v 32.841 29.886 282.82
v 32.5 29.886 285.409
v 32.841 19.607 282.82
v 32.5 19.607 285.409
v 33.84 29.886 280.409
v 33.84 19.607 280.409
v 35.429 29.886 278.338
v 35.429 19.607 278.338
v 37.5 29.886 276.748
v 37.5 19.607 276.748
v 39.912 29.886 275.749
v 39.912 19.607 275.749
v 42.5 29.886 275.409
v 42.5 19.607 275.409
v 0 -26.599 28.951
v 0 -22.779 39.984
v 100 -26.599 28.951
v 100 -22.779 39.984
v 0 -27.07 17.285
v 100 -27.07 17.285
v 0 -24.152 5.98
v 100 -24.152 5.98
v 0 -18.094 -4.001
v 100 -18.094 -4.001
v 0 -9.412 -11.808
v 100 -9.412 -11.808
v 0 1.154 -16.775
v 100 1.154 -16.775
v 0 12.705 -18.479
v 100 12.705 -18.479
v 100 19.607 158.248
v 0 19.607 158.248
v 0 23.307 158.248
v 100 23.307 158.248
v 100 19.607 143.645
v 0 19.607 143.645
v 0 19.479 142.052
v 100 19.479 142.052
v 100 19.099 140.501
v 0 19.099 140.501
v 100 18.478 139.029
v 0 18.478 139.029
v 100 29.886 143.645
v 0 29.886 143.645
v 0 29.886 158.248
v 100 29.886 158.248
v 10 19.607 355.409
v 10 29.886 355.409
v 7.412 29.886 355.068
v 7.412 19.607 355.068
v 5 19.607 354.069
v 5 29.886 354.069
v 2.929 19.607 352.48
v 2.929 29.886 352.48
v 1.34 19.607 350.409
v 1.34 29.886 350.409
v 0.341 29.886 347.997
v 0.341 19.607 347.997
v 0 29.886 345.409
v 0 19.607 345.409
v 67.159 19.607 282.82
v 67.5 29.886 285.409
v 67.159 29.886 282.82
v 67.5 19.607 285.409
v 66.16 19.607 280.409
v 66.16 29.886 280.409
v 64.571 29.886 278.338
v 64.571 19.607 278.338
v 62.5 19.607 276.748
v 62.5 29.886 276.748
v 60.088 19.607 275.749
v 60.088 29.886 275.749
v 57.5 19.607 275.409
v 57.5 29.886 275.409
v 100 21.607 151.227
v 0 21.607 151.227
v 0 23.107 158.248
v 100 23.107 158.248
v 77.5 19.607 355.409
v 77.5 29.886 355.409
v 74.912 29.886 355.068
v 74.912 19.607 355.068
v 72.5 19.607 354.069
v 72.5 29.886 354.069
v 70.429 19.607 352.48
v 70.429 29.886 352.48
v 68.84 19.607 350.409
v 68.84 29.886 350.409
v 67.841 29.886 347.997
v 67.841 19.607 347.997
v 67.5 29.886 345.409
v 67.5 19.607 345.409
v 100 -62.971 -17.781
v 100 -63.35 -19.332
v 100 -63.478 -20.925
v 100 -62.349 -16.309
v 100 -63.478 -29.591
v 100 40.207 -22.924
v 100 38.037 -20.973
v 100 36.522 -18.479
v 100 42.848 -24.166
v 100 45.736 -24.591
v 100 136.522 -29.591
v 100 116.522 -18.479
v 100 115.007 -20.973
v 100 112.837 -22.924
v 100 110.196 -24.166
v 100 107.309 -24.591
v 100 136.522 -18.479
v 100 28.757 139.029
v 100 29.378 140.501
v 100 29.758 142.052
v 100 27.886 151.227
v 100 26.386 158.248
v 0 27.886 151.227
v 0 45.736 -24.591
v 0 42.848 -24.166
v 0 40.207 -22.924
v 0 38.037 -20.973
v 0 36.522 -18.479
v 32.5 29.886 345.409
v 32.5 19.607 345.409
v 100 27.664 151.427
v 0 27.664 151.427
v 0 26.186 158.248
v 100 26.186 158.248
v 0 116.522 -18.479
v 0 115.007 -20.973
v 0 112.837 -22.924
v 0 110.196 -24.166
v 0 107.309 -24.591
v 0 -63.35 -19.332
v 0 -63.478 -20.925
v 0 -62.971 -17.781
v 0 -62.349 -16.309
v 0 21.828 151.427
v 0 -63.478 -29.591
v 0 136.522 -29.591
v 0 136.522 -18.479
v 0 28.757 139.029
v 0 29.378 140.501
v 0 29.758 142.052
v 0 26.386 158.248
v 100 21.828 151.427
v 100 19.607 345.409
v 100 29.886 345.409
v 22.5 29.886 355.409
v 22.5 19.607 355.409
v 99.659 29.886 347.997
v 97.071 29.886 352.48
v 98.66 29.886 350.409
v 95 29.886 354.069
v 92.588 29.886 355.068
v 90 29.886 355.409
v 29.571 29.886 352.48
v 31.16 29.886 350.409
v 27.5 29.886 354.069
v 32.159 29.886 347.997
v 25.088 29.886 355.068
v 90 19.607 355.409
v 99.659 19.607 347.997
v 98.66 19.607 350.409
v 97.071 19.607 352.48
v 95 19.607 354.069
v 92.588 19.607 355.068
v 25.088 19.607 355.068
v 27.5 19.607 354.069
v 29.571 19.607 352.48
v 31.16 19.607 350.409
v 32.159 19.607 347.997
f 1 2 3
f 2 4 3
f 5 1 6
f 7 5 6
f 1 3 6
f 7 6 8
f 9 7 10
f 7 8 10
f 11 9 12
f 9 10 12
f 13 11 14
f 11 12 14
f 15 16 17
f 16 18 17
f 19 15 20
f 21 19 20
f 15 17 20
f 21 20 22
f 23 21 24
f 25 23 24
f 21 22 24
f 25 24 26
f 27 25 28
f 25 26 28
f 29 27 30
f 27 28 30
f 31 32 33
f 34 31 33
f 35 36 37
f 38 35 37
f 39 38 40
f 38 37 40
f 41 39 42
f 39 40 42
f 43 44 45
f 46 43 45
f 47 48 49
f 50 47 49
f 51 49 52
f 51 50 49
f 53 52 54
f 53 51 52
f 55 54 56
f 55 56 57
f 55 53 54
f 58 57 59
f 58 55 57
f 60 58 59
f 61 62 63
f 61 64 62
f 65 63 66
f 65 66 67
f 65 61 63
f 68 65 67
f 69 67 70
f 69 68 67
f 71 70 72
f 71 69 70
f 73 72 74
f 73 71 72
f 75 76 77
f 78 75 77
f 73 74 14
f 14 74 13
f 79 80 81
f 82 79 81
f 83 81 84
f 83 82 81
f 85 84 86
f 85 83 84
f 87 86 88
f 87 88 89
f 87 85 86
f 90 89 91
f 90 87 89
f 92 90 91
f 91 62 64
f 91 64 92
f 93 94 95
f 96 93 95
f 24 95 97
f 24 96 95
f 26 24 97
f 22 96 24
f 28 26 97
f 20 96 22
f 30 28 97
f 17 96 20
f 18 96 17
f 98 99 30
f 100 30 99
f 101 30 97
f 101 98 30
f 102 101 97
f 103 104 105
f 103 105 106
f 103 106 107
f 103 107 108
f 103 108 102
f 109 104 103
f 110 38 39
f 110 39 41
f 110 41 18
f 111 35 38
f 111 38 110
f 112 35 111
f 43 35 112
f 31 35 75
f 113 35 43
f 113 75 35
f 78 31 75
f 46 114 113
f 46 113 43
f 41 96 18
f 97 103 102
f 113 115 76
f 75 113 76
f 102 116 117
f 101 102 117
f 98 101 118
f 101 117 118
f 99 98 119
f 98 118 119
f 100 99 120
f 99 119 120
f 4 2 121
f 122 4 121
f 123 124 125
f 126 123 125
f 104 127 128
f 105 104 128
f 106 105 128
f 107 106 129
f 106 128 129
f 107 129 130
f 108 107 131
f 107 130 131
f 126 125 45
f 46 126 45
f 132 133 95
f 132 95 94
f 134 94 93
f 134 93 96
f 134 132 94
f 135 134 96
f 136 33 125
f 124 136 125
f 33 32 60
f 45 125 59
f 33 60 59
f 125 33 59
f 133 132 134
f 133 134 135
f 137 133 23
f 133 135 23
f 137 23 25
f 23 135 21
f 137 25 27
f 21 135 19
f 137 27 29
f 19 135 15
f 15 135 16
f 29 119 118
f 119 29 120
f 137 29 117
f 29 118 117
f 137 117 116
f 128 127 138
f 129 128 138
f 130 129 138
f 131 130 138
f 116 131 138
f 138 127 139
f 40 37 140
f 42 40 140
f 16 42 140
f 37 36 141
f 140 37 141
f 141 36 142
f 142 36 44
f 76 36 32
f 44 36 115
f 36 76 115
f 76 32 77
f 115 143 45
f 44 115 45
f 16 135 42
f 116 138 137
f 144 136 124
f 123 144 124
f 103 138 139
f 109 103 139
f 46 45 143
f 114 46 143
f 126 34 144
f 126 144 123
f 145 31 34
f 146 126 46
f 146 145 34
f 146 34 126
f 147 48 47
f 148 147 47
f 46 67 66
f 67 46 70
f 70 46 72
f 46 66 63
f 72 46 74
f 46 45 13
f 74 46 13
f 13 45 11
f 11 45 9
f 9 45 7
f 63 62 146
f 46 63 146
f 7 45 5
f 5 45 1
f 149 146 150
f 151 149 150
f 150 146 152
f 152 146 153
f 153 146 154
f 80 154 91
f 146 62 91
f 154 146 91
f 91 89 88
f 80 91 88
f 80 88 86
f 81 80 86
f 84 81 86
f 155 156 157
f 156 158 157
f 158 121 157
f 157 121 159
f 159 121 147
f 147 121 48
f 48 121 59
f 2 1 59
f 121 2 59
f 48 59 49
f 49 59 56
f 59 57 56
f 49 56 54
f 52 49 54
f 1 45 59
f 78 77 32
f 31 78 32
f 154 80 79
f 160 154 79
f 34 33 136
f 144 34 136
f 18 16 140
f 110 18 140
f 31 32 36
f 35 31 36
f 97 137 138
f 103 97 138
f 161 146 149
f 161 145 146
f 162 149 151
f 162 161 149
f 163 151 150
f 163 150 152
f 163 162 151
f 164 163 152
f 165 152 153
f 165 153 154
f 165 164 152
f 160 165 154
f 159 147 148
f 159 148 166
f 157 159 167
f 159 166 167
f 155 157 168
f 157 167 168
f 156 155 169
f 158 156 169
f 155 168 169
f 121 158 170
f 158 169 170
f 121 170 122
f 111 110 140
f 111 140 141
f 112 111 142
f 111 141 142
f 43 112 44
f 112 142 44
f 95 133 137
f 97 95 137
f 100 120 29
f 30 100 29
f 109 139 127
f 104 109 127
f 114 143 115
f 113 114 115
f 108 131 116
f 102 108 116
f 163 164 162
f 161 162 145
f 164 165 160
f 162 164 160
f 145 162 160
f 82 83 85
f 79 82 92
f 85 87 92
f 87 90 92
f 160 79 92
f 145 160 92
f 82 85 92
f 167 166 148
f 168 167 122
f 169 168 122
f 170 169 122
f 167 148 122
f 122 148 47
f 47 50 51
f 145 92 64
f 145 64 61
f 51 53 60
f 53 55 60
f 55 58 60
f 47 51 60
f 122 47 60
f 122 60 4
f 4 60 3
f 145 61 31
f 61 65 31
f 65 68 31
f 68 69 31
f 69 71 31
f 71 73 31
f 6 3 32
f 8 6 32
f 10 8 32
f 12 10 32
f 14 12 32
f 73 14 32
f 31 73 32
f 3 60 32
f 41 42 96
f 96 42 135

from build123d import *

# Parameters (mm, degrees)
F1_DEPTH    = 100
F2_T1_DEPTH = 100
F2_T3_DEPTH = 100
F2_T5_DEPTH = 100
F2_T7_DEPTH = 112.2298810339
F2_T9_DEPTH = 112.2298810339
F4_DEPTH    = 100
F5_W        = 35
F5_H        = 80
F6_DEPTH    = 25
F7_R        = 10
F8_R        = 40


# Not quite as in the source:
# - a fillet or chamfer that OpenCascade refuses, or shapes differently, is made with other operations: its cross-section is extruded or revolved along the edge and cut away or added


with BuildPart() as f1:
    # F0 (on Right) → F1 (new body)
    with BuildSketch(Plane.YZ):
        Polygon((136.5221505807, -29.5914116513), (136.5221505807, -18.4788270524), (116.5221505807, -18.4788270524), (116.5221505807, -24.5914116513), (36.5221505807, -24.5914116513), (36.5221505807, -18.4788270524), (-53.1987108176, -18.4788270524), (-63.4778494193, -18.4788270524), (-63.4778494193, -29.5914116513), align=None)
        Polygon((19.6065225478, 158.2476049662), (19.6065225478, 141.1989332489), (29.8856611494, 141.1989332489), (29.8856611494, 158.2476049662), (26.3856611494, 158.2476049662), (27.8856611494, 151.2272953987), (21.6065225478, 151.2272953987), (23.1065225478, 158.2476049662), align=None)
        Polygon((19.6065225478, 141.1989332489), (-63.4778494193, -18.4788270524), (-53.1987108176, -18.4788270524), (29.8856611494, 141.1989332489), align=None)
    extrude(amount=F1_DEPTH)

    # F2: fillet of radius 10 on 5 edges, made by hand

    # F2_s2 → F2_t1 (join)
    with BuildSketch(Plane.YZ):
        with BuildLine():
            ThreePointArc((116.5221505807, -18.4788270524), (112.8370564508, -22.9243029266), (107.3086820971, -24.5914116513))
            Line((107.3086820971, -24.5914116513), (116.5221505807, -24.5914116513))
            Line((116.5221505807, -24.5914116513), (116.5221505807, -18.4788270524))
        make_face()
    extrude(amount=F2_T1_DEPTH)

    # F2_s4 → F2_t3 (join)
    with BuildSketch(Plane.YZ):
        with BuildLine():
            ThreePointArc((45.7356190644, -24.5914116513), (40.2072447107, -22.9243029266), (36.5221505807, -18.4788270524))
            Line((36.5221505807, -18.4788270524), (36.5221505807, -24.5914116513))
            Line((36.5221505807, -24.5914116513), (45.7356190644, -24.5914116513))
        make_face()
    extrude(amount=F2_T3_DEPTH)

    # F2_s6 → F2_t5 (join)
    with BuildSketch(Plane.YZ):
        with BuildLine():
            ThreePointArc((19.6065225478, 143.6449094556), (19.3201693098, 141.2689745696), (18.4775092312, 139.029111013))
            Line((18.4775092312, 139.029111013), (19.6065225478, 141.1989332489))
            Line((19.6065225478, 141.1989332489), (19.6065225478, 143.6449094556))
        make_face()
    extrude(amount=F2_T5_DEPTH)

    # F2_s8 → F2_t7 (cut)
    with BuildSketch(Plane.YZ.offset(-6.114940517)):
        with BuildLine():
            ThreePointArc((28.7566478328, 139.029111013), (29.5993079114, 141.2689745696), (29.8856611494, 143.6449094556))
            Line((29.8856611494, 143.6449094556), (29.8856611494, 141.1989332489))
            Line((29.8856611494, 141.1989332489), (28.7566478328, 139.029111013))
        make_face()
    extrude(amount=F2_T7_DEPTH, mode=Mode.SUBTRACT)

    # F2_s10 → F2_t9 (cut)
    with BuildSketch(Plane.YZ.offset(-6.114940517)):
        with BuildLine():
            ThreePointArc((-63.4778494193, -20.9248032592), (-63.1914961813, -18.5488683731), (-62.3488361027, -16.3090048166))
            Line((-62.3488361027, -16.3090048166), (-63.4778494193, -18.4788270524))
            Line((-63.4778494193, -18.4788270524), (-63.4778494193, -20.9248032592))
        make_face()
    extrude(amount=F2_T9_DEPTH, mode=Mode.SUBTRACT)

    # F8
    f8_edges = [f1.edges().sort_by_distance(p)[0] for p in [
        (50, -53.198711, -18.478827),
    ]]
    fillet(f8_edges, radius=F8_R)


with BuildPart() as f4:
    # F3 (on face) → F4 (new body)
    with BuildSketch(Plane.YZ):
        Polygon((29.8856611494, 355.4085883487), (19.6065225478, 355.4085883487), (19.6065225478, 158.2476049662), (23.1065225478, 158.2476049662), (23.3065225478, 158.2476049662), (21.8278891269, 151.4272953987), (24.5640873909, 151.4272953987), (27.6642945703, 151.4272953987), (26.1856611494, 158.2476049662), (26.3856611494, 158.2476049662), (29.8856611494, 158.2476049662), align=None)
    extrude(amount=F4_DEPTH)

    # F5 (on face) → F6 (cut)
    with BuildSketch(Plane(origin=(0, 29.8856611494, 0), x_dir=(-1, 0, 0), z_dir=(0, 1, 0))):
        with Locations((-50, 315.4085883487)):
            Rectangle(F5_W, F5_H)
    extrude(amount=-F6_DEPTH, mode=Mode.SUBTRACT)

    # F7
    f7_edges = [f4.edges().sort_by_distance(p)[0] for p in [
        (32.5, 24.746092, 275.408588),
        (67.5, 24.746092, 275.408588),
        (32.5, 24.746092, 355.408588),
        (67.5, 24.746092, 355.408588),
        (100, 24.746092, 355.408588),
        (0, 24.746092, 355.408588),
    ]]
    fillet(f7_edges, radius=F7_R)


solid = Compound([f1.part, f4.part])
